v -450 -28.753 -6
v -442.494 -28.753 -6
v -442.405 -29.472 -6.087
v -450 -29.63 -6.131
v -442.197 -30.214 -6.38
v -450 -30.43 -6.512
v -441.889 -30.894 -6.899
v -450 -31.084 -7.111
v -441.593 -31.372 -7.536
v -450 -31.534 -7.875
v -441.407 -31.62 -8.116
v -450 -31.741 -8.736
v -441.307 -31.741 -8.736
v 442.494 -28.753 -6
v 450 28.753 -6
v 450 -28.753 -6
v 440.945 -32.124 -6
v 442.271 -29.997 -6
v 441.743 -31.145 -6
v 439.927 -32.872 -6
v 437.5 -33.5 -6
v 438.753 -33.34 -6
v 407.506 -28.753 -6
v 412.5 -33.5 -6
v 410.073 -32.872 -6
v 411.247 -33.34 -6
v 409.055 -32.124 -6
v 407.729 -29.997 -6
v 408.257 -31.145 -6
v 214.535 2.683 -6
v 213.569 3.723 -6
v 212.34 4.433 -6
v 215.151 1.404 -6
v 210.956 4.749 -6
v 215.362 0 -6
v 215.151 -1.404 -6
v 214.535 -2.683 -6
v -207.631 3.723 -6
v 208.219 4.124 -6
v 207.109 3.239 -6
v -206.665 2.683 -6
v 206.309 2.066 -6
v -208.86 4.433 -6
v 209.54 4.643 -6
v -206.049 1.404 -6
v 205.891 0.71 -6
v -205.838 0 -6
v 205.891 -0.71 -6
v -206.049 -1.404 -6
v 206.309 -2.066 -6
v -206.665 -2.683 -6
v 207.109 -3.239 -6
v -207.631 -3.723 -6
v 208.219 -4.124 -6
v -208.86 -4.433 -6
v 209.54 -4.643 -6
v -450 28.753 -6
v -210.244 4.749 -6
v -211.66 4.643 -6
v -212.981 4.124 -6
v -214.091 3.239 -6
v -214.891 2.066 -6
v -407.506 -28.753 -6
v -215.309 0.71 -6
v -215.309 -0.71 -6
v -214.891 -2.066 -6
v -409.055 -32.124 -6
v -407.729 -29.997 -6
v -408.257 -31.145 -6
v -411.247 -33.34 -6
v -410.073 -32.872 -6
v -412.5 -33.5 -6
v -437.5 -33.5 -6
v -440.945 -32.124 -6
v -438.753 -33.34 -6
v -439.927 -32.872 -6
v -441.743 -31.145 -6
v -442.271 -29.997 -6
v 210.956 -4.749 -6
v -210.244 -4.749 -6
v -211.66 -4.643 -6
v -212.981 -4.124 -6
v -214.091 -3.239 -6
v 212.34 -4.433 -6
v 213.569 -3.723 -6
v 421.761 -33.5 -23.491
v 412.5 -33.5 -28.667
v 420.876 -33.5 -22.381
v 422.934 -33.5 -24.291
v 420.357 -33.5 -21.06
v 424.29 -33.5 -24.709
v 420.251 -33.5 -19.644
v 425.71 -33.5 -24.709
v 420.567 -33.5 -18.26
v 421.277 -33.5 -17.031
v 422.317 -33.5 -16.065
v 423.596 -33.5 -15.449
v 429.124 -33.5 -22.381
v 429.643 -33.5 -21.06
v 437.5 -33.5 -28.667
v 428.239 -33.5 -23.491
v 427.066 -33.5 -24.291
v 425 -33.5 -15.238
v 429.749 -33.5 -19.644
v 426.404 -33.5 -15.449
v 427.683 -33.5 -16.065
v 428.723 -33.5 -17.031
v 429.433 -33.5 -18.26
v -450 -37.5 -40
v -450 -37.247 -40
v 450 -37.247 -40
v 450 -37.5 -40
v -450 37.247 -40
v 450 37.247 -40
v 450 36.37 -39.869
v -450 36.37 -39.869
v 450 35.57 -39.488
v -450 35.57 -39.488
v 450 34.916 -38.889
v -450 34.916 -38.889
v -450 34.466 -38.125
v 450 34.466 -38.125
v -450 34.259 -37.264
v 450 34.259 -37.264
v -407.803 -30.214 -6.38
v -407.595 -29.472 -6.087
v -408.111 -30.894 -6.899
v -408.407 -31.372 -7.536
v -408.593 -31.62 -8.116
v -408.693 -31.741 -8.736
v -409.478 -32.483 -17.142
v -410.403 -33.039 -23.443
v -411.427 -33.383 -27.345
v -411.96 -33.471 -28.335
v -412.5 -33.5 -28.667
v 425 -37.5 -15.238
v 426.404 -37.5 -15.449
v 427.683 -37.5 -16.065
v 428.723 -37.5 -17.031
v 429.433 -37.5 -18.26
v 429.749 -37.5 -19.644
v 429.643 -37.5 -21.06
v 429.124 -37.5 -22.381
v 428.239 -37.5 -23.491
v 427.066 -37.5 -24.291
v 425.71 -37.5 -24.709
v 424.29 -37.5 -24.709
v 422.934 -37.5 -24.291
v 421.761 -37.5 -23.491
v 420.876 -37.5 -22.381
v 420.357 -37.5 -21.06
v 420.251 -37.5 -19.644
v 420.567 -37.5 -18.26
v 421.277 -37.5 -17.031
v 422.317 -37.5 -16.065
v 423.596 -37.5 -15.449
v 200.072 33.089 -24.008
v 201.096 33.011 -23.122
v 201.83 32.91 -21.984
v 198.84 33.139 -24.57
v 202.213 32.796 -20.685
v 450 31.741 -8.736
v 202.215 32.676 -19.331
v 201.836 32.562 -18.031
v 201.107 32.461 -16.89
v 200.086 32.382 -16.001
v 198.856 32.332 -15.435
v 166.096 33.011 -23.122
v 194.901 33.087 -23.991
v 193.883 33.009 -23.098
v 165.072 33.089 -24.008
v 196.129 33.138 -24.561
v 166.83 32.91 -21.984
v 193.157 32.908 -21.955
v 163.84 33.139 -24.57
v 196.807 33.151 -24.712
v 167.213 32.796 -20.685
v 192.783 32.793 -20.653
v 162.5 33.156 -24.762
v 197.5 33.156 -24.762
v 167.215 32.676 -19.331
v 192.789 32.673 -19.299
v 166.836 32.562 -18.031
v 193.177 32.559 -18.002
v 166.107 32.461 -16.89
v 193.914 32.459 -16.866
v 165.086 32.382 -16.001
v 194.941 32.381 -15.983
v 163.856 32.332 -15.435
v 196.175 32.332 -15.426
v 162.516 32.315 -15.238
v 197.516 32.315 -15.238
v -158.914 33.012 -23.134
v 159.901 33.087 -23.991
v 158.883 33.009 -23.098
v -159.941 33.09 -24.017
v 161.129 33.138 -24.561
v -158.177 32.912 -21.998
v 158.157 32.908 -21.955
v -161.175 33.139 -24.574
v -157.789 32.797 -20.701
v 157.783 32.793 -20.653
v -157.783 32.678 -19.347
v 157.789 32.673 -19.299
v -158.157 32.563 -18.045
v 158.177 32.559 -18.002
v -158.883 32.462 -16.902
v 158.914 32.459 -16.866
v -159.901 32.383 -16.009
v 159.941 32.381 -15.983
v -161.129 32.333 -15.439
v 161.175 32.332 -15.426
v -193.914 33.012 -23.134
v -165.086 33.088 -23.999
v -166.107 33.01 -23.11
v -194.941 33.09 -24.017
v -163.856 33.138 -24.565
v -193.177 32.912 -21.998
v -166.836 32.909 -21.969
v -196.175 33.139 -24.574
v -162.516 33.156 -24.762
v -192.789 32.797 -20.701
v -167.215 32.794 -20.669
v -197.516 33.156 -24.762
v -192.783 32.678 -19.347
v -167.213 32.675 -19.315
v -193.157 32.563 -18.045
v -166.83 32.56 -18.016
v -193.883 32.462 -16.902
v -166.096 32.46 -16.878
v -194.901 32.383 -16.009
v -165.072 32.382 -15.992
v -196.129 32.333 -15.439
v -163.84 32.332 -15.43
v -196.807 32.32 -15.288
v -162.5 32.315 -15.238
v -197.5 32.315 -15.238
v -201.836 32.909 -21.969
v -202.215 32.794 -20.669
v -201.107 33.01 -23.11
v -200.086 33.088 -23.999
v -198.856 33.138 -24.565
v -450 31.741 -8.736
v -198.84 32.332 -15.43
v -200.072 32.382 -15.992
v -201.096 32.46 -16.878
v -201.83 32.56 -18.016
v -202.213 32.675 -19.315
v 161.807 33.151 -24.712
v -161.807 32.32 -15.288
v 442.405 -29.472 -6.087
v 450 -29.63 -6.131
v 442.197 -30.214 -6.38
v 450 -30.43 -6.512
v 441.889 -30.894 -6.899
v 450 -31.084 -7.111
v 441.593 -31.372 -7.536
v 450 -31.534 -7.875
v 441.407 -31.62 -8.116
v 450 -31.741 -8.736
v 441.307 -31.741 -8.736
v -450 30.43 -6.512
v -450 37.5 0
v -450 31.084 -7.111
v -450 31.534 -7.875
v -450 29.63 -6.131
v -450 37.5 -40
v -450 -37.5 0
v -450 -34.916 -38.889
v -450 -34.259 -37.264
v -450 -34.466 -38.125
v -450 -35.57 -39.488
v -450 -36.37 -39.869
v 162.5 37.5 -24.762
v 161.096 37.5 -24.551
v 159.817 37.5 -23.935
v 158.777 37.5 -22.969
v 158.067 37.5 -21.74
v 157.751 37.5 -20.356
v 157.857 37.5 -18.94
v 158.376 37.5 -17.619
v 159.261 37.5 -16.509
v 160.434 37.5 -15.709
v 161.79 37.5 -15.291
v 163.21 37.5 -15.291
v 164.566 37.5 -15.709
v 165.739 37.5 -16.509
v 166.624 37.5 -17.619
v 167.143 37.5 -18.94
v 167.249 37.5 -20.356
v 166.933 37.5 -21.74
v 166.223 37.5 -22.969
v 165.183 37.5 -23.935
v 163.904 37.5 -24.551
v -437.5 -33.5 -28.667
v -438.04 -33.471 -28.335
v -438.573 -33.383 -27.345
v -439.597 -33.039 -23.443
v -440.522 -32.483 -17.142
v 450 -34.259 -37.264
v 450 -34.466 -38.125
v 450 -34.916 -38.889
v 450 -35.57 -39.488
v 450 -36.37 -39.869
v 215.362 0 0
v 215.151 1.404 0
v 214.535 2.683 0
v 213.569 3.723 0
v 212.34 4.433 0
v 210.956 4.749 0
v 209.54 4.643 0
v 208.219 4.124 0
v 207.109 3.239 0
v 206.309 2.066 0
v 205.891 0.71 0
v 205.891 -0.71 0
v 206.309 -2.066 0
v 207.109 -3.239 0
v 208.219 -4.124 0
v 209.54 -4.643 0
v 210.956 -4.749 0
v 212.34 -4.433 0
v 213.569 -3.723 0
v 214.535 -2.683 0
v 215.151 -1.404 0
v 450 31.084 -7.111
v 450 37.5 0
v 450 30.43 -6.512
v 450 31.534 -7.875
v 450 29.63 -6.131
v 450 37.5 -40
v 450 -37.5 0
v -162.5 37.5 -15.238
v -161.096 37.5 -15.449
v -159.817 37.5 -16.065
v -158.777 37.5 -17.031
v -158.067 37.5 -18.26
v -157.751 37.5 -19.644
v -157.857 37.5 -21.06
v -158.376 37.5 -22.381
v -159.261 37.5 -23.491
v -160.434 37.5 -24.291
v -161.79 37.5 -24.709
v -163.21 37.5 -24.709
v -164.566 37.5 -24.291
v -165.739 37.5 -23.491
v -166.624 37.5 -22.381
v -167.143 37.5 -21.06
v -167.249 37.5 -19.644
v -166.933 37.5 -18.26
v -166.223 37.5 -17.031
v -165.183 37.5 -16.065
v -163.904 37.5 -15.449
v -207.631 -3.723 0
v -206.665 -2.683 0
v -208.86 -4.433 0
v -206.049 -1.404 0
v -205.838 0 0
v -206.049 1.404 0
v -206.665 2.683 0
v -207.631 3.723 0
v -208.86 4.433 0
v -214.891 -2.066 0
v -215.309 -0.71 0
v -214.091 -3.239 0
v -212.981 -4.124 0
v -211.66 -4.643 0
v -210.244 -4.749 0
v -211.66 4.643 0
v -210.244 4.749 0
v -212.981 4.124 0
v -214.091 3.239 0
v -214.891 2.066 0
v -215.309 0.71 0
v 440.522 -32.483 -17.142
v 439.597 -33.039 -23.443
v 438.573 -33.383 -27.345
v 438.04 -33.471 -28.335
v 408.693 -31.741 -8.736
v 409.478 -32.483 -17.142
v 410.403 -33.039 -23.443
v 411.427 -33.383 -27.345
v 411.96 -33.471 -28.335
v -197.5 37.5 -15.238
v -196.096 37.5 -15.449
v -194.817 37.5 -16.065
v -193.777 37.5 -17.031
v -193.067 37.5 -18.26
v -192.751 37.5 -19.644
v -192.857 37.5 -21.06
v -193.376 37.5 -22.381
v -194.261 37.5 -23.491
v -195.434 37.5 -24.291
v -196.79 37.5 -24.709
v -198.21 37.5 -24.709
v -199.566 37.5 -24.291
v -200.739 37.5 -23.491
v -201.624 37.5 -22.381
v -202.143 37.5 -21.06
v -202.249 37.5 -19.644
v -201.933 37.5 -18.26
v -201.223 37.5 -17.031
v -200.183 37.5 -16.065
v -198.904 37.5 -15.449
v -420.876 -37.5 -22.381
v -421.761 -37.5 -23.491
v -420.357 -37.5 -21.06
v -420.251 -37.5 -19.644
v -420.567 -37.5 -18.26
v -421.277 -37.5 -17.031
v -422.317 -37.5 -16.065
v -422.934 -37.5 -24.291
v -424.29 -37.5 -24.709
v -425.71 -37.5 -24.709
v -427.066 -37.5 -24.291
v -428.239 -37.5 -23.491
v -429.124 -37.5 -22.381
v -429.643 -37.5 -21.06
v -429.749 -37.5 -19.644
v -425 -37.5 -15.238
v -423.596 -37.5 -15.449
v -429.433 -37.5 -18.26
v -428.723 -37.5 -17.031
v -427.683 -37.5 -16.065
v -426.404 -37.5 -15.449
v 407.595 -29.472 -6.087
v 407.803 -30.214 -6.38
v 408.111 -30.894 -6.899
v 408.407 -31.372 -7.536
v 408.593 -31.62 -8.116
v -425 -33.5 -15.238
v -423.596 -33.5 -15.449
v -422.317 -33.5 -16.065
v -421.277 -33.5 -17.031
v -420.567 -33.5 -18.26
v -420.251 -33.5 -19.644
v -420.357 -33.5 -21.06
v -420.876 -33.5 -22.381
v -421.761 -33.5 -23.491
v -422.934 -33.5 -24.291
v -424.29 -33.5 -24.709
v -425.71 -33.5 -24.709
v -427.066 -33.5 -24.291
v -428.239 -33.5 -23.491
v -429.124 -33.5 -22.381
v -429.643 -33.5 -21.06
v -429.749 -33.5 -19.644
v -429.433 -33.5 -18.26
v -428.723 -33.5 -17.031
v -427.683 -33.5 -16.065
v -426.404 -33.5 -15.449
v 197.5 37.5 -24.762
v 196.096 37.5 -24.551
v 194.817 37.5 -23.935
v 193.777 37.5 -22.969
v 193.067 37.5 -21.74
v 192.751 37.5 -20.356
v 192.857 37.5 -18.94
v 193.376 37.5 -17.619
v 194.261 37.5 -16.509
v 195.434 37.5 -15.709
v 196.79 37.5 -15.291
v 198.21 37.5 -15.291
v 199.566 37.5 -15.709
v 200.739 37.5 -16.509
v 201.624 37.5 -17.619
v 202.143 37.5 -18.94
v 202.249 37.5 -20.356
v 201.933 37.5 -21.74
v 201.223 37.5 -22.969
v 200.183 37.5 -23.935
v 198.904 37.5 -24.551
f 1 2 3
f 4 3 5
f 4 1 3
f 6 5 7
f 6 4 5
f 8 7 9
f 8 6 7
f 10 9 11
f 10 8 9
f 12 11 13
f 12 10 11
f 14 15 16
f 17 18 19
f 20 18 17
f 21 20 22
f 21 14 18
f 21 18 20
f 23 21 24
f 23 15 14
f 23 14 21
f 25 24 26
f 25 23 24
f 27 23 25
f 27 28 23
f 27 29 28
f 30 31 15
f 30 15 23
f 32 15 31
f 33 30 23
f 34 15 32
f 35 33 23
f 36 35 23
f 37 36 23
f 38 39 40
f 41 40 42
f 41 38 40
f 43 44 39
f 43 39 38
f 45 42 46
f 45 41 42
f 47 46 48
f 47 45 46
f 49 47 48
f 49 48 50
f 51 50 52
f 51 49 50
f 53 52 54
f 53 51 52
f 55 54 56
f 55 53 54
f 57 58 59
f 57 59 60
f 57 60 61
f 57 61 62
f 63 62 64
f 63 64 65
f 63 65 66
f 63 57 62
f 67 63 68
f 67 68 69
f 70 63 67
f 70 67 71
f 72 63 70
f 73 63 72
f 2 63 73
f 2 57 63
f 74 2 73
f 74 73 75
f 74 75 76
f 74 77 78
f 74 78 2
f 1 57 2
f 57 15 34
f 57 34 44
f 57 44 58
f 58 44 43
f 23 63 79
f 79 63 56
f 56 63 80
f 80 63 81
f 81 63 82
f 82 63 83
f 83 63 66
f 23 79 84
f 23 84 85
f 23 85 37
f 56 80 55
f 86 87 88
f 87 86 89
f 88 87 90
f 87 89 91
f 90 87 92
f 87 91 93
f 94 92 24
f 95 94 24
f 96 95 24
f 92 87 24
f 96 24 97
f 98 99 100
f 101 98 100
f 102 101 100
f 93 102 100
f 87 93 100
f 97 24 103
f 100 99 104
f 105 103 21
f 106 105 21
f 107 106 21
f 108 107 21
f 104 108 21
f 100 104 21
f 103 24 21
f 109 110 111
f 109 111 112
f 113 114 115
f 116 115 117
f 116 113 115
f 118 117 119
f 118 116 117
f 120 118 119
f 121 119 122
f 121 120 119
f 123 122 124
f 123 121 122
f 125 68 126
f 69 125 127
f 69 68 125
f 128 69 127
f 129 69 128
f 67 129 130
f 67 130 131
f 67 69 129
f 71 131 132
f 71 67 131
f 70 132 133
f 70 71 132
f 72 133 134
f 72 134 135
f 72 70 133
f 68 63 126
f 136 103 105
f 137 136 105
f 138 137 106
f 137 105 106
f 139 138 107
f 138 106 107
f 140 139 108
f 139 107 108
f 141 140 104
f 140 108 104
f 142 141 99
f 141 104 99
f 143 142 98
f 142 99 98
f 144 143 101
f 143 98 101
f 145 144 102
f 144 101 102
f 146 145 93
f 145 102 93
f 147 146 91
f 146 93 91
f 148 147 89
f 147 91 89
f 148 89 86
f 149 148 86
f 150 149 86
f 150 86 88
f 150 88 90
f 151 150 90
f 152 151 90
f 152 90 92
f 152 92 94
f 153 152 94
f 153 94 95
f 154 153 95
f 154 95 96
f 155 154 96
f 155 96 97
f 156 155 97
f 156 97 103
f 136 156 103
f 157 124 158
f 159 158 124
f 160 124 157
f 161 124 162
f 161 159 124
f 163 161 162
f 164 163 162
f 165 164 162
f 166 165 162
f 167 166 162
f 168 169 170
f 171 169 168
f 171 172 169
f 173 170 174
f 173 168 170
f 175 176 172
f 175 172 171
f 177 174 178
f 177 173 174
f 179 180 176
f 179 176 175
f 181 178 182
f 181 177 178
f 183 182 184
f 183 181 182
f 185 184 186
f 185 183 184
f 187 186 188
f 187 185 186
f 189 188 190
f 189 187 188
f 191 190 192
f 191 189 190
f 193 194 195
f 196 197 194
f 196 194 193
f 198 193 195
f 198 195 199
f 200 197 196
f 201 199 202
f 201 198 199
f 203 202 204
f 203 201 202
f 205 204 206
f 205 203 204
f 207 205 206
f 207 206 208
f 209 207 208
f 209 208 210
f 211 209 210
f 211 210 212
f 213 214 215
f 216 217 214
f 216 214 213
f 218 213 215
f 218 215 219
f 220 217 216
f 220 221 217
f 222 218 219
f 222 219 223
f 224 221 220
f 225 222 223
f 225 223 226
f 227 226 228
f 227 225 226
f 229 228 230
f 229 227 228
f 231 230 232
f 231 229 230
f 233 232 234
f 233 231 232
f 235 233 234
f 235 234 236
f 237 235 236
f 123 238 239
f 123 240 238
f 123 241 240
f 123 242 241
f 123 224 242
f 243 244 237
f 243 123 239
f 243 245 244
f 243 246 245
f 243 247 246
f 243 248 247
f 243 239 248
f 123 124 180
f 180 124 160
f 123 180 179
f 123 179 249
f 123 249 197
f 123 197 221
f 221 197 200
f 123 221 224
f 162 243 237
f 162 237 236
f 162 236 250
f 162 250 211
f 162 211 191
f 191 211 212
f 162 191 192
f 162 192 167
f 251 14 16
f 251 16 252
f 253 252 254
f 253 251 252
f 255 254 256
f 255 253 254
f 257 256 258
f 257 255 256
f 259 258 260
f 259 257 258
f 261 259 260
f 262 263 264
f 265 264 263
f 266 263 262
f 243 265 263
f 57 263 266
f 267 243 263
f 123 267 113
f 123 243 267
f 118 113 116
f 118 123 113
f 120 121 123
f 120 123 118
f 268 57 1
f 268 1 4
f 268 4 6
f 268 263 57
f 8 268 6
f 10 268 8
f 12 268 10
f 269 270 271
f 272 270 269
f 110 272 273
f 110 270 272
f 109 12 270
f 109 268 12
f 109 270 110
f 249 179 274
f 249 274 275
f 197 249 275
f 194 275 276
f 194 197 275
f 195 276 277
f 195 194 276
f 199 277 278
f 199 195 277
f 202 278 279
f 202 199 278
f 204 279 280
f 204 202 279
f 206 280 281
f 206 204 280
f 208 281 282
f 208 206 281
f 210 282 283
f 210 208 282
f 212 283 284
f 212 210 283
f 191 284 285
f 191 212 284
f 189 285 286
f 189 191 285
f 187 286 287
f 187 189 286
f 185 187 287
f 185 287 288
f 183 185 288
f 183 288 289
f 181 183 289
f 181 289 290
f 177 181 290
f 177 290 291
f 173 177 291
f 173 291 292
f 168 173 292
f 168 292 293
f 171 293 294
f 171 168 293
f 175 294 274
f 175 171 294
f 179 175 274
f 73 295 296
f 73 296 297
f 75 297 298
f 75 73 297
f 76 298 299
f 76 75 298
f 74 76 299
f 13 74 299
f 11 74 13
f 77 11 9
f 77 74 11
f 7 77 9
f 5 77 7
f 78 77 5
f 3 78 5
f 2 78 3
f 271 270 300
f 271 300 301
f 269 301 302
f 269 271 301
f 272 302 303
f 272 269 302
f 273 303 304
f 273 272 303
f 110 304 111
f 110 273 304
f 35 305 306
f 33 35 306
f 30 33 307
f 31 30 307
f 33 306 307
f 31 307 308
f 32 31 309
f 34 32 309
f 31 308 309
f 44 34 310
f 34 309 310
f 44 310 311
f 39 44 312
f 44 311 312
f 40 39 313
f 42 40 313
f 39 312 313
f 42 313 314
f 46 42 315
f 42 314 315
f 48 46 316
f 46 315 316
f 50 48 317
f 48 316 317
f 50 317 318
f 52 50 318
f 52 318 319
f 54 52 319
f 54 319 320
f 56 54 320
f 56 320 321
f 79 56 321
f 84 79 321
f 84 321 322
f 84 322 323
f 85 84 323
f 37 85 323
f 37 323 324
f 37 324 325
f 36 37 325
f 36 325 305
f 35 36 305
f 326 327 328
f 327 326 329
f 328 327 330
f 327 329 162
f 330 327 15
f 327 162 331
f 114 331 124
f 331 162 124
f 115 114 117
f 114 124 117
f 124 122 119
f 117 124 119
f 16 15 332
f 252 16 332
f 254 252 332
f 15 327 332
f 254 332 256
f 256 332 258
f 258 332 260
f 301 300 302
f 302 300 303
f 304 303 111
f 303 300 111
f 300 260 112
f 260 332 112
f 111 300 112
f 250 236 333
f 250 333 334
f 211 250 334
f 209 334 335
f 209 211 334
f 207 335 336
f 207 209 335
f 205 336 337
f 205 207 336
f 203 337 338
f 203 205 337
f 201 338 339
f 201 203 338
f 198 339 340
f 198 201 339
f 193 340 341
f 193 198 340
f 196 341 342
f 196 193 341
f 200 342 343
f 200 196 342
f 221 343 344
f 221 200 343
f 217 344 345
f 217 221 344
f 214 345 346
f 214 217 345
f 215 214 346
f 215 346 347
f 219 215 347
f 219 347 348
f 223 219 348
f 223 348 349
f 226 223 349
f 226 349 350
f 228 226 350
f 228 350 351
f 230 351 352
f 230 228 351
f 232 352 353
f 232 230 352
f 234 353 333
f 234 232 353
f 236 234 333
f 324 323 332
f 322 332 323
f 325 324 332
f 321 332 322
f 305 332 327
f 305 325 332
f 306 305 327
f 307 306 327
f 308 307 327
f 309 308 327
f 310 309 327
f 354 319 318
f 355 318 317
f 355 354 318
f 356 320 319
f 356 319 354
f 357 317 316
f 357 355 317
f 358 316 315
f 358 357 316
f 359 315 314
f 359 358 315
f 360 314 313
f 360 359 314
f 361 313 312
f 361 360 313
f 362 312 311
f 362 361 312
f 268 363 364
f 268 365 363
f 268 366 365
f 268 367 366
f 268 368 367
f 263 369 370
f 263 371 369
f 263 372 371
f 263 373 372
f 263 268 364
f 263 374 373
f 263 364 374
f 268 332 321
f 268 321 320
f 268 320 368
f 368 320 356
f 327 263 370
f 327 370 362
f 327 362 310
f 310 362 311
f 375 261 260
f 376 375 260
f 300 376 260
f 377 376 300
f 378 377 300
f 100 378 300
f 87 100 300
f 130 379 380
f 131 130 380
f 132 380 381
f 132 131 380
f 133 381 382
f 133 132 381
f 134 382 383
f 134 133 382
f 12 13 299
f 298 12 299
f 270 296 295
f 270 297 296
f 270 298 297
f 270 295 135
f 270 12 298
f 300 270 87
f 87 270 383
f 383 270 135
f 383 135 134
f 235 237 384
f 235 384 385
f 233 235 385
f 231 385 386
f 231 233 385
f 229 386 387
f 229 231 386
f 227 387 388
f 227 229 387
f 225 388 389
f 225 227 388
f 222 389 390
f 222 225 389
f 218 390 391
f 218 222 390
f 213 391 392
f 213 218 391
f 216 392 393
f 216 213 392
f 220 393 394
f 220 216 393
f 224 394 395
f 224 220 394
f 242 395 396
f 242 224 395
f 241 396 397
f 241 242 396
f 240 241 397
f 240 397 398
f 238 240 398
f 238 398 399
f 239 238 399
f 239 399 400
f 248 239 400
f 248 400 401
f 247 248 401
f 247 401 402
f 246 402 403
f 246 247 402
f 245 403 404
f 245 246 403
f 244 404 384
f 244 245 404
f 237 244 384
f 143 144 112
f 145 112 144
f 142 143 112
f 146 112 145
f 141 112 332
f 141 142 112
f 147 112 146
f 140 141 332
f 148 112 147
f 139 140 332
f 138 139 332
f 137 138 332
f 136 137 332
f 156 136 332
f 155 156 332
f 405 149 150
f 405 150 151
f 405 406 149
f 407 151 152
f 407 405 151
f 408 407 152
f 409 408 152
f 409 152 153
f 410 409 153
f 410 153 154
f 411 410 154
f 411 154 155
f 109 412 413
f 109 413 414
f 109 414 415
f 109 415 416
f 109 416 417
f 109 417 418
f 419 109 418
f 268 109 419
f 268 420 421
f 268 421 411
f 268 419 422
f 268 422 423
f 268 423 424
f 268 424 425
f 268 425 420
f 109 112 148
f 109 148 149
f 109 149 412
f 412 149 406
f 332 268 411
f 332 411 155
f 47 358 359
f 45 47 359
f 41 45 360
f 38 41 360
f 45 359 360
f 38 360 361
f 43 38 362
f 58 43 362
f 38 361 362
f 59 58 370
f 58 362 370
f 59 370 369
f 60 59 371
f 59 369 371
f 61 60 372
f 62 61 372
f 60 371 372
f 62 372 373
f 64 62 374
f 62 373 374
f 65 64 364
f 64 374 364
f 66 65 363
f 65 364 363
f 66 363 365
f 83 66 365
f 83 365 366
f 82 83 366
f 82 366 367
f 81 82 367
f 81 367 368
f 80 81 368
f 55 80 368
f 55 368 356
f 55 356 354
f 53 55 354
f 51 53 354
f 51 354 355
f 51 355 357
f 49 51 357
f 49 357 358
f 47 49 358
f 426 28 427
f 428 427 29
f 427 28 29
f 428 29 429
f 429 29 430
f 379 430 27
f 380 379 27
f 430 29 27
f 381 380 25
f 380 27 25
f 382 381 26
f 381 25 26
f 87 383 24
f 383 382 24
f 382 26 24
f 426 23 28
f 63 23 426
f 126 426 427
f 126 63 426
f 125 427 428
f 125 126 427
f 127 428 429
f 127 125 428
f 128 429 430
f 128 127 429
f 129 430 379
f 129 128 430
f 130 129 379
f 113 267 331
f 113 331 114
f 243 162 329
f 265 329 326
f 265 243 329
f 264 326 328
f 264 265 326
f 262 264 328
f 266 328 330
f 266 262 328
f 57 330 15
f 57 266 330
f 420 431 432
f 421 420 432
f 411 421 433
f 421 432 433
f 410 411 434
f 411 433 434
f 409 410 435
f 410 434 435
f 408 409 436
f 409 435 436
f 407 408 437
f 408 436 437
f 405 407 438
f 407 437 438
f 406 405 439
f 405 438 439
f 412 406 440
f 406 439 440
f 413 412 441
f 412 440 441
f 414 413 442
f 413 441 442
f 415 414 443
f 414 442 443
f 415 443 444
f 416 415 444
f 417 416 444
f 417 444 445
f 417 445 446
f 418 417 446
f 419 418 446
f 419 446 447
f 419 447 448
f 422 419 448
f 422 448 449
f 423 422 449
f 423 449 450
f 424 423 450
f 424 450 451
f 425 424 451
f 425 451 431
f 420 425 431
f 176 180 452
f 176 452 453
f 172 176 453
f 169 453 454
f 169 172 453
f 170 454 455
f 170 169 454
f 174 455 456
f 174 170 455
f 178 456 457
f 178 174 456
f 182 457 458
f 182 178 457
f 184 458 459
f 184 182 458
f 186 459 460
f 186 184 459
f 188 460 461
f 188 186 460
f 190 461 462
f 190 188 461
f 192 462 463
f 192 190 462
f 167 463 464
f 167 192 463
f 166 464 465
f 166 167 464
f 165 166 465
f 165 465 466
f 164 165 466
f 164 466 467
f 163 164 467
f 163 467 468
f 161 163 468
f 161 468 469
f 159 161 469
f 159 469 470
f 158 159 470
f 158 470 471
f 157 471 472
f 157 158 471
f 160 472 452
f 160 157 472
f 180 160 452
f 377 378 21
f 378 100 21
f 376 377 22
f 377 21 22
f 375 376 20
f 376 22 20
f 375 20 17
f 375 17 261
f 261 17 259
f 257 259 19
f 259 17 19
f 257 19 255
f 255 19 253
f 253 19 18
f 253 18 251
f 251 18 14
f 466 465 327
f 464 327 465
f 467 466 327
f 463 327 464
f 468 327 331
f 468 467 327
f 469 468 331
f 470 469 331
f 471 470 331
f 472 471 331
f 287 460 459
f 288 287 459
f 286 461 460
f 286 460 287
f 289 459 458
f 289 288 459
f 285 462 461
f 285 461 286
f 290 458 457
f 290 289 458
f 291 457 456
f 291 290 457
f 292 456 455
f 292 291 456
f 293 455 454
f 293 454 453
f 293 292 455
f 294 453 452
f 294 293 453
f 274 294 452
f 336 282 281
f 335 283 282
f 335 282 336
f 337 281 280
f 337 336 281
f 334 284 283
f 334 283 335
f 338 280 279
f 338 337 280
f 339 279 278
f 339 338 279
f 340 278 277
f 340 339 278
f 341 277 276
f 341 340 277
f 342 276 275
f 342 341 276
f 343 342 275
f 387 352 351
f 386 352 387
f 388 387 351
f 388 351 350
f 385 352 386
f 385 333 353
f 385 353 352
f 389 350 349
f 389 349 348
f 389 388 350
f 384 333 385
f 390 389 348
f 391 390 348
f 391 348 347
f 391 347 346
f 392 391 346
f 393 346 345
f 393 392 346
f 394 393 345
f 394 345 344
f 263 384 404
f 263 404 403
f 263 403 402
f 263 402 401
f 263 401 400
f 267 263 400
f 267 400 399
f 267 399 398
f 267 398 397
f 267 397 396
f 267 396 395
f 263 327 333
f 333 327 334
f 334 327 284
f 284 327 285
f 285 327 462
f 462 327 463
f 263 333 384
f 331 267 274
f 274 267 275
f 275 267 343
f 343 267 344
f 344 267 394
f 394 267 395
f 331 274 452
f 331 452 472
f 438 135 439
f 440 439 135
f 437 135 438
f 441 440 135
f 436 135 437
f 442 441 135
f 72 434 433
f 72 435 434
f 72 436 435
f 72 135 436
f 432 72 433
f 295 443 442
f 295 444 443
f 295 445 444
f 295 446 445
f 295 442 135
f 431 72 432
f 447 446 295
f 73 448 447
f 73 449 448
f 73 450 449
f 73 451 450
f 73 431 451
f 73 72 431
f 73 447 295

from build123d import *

# Parameters (mm, degrees)
STRUCTURAL_MEMBER1_DEPTH = 900
SKETCH12_R               = 4.7625
CUT_EXTRUDE1_DEPTH       = 454.327971782
CUT_EXTRUDE2_DEPTH       = 40
SKETCH16_R               = 4.7625
CUT_EXTRUDE3_DEPTH       = 454.327971881
SKETCH17_R               = 4.7625
CUT_EXTRUDE4_DEPTH       = 454.327971881


with BuildPart() as part:
    # Sketch112 → Structural Member1 (new body)
    with BuildSketch(Plane(origin=(-450, 0, 0), x_dir=(0, 0, 1), z_dir=(1, 0, 0))):
        with BuildLine():
            Line((0, 37.5), (0, -37.5))
            Line((0, -37.5), (-40, -37.5))
            Line((-40, -37.5), (-40, -37.246949676))
            ThreePointArc((-40, -37.246949676), (-39.212582687, -35.220998578), (-37.263681431, -34.258560126))
            Line((-37.263681431, -34.258560126), (-8.736318569, -31.741439874))
            ThreePointArc((-8.736318569, -31.741439874), (-6.787417313, -30.779001422), (-6, -28.753050324))
            Line((-6, -28.753050324), (-6, 28.753050324))
            ThreePointArc((-6, 28.753050324), (-6.787417313, 30.779001422), (-8.736318569, 31.741439874))
            Line((-8.736318569, 31.741439874), (-37.263681431, 34.258560126))
            ThreePointArc((-37.263681431, 34.258560126), (-39.212582687, 35.220998578), (-40, 37.246949676))
            Line((-40, 37.246949676), (-40, 37.5))
            Line((-40, 37.5), (0, 37.5))
        make_face()
    extrude(amount=STRUCTURAL_MEMBER1_DEPTH)

    # Sketch12 → Cut-Extrude1 (cut, through all)
    with BuildSketch(Plane(origin=(0, 0, 0), x_dir=(1, 0, 0), z_dir=(0, 1, 0))):
        with Locations(Location((-425, 20, 0), (0, 0, 270))):
            Circle(SKETCH12_R)
        with Locations(Location((425, 20, 0), (0, 0, 270))):
            Circle(SKETCH12_R)
    extrude(amount=-CUT_EXTRUDE1_DEPTH, mode=Mode.SUBTRACT)

    # Sketch15 → Cut-Extrude2 (cut)
    with BuildSketch(Plane(origin=(0, 0, -6), x_dir=(-1, 0, 0), z_dir=(0, 0, -1))):
        with BuildLine():
            Line((-412.5, -33.5), (-437.5, -33.5))
            ThreePointArc((-437.5, -33.5), (-442.5, -28.5), (-437.5, -23.5))
            Line((-437.5, -23.5), (-412.5, -23.5))
            ThreePointArc((-412.5, -23.5), (-407.5, -28.5), (-412.5, -33.5))
        make_face()
        with BuildLine():
            Line((412.5, -33.5), (437.5, -33.5))
            ThreePointArc((437.5, -33.5), (442.5, -28.5), (437.5, -23.5))
            Line((437.5, -23.5), (412.5, -23.5))
            ThreePointArc((412.5, -23.5), (407.5, -28.5), (412.5, -33.5))
        make_face()
    extrude(amount=CUT_EXTRUDE2_DEPTH, mode=Mode.SUBTRACT)

    # Sketch16 → Cut-Extrude3 (cut, through all)
    with BuildSketch(Plane(origin=(0, 0, 0), x_dir=(1, 0, 0), z_dir=(0, 1, 0))):
        with Locations(Location((-197.5, 20, 0), (0, 0, 270))):
            Circle(SKETCH16_R)
        with Locations(Location((-162.5, 20, 0), (0, 0, 270))):
            Circle(SKETCH16_R)
        with Locations(Location((162.5, 20, 0), (0, 0, 90))):
            Circle(SKETCH16_R)
        with Locations(Location((197.5, 20, 0), (0, 0, 90))):
            Circle(SKETCH16_R)
    extrude(amount=CUT_EXTRUDE3_DEPTH, mode=Mode.SUBTRACT)

    # Sketch17 → Cut-Extrude4 (cut, through all)
    with BuildSketch(Plane.XY):
        with Locations((-210.6, 0)):
            Circle(SKETCH17_R)
        with Locations((210.6, 0)):
            Circle(SKETCH17_R)
    extrude(amount=-CUT_EXTRUDE4_DEPTH, mode=Mode.SUBTRACT)


solid = part.part
